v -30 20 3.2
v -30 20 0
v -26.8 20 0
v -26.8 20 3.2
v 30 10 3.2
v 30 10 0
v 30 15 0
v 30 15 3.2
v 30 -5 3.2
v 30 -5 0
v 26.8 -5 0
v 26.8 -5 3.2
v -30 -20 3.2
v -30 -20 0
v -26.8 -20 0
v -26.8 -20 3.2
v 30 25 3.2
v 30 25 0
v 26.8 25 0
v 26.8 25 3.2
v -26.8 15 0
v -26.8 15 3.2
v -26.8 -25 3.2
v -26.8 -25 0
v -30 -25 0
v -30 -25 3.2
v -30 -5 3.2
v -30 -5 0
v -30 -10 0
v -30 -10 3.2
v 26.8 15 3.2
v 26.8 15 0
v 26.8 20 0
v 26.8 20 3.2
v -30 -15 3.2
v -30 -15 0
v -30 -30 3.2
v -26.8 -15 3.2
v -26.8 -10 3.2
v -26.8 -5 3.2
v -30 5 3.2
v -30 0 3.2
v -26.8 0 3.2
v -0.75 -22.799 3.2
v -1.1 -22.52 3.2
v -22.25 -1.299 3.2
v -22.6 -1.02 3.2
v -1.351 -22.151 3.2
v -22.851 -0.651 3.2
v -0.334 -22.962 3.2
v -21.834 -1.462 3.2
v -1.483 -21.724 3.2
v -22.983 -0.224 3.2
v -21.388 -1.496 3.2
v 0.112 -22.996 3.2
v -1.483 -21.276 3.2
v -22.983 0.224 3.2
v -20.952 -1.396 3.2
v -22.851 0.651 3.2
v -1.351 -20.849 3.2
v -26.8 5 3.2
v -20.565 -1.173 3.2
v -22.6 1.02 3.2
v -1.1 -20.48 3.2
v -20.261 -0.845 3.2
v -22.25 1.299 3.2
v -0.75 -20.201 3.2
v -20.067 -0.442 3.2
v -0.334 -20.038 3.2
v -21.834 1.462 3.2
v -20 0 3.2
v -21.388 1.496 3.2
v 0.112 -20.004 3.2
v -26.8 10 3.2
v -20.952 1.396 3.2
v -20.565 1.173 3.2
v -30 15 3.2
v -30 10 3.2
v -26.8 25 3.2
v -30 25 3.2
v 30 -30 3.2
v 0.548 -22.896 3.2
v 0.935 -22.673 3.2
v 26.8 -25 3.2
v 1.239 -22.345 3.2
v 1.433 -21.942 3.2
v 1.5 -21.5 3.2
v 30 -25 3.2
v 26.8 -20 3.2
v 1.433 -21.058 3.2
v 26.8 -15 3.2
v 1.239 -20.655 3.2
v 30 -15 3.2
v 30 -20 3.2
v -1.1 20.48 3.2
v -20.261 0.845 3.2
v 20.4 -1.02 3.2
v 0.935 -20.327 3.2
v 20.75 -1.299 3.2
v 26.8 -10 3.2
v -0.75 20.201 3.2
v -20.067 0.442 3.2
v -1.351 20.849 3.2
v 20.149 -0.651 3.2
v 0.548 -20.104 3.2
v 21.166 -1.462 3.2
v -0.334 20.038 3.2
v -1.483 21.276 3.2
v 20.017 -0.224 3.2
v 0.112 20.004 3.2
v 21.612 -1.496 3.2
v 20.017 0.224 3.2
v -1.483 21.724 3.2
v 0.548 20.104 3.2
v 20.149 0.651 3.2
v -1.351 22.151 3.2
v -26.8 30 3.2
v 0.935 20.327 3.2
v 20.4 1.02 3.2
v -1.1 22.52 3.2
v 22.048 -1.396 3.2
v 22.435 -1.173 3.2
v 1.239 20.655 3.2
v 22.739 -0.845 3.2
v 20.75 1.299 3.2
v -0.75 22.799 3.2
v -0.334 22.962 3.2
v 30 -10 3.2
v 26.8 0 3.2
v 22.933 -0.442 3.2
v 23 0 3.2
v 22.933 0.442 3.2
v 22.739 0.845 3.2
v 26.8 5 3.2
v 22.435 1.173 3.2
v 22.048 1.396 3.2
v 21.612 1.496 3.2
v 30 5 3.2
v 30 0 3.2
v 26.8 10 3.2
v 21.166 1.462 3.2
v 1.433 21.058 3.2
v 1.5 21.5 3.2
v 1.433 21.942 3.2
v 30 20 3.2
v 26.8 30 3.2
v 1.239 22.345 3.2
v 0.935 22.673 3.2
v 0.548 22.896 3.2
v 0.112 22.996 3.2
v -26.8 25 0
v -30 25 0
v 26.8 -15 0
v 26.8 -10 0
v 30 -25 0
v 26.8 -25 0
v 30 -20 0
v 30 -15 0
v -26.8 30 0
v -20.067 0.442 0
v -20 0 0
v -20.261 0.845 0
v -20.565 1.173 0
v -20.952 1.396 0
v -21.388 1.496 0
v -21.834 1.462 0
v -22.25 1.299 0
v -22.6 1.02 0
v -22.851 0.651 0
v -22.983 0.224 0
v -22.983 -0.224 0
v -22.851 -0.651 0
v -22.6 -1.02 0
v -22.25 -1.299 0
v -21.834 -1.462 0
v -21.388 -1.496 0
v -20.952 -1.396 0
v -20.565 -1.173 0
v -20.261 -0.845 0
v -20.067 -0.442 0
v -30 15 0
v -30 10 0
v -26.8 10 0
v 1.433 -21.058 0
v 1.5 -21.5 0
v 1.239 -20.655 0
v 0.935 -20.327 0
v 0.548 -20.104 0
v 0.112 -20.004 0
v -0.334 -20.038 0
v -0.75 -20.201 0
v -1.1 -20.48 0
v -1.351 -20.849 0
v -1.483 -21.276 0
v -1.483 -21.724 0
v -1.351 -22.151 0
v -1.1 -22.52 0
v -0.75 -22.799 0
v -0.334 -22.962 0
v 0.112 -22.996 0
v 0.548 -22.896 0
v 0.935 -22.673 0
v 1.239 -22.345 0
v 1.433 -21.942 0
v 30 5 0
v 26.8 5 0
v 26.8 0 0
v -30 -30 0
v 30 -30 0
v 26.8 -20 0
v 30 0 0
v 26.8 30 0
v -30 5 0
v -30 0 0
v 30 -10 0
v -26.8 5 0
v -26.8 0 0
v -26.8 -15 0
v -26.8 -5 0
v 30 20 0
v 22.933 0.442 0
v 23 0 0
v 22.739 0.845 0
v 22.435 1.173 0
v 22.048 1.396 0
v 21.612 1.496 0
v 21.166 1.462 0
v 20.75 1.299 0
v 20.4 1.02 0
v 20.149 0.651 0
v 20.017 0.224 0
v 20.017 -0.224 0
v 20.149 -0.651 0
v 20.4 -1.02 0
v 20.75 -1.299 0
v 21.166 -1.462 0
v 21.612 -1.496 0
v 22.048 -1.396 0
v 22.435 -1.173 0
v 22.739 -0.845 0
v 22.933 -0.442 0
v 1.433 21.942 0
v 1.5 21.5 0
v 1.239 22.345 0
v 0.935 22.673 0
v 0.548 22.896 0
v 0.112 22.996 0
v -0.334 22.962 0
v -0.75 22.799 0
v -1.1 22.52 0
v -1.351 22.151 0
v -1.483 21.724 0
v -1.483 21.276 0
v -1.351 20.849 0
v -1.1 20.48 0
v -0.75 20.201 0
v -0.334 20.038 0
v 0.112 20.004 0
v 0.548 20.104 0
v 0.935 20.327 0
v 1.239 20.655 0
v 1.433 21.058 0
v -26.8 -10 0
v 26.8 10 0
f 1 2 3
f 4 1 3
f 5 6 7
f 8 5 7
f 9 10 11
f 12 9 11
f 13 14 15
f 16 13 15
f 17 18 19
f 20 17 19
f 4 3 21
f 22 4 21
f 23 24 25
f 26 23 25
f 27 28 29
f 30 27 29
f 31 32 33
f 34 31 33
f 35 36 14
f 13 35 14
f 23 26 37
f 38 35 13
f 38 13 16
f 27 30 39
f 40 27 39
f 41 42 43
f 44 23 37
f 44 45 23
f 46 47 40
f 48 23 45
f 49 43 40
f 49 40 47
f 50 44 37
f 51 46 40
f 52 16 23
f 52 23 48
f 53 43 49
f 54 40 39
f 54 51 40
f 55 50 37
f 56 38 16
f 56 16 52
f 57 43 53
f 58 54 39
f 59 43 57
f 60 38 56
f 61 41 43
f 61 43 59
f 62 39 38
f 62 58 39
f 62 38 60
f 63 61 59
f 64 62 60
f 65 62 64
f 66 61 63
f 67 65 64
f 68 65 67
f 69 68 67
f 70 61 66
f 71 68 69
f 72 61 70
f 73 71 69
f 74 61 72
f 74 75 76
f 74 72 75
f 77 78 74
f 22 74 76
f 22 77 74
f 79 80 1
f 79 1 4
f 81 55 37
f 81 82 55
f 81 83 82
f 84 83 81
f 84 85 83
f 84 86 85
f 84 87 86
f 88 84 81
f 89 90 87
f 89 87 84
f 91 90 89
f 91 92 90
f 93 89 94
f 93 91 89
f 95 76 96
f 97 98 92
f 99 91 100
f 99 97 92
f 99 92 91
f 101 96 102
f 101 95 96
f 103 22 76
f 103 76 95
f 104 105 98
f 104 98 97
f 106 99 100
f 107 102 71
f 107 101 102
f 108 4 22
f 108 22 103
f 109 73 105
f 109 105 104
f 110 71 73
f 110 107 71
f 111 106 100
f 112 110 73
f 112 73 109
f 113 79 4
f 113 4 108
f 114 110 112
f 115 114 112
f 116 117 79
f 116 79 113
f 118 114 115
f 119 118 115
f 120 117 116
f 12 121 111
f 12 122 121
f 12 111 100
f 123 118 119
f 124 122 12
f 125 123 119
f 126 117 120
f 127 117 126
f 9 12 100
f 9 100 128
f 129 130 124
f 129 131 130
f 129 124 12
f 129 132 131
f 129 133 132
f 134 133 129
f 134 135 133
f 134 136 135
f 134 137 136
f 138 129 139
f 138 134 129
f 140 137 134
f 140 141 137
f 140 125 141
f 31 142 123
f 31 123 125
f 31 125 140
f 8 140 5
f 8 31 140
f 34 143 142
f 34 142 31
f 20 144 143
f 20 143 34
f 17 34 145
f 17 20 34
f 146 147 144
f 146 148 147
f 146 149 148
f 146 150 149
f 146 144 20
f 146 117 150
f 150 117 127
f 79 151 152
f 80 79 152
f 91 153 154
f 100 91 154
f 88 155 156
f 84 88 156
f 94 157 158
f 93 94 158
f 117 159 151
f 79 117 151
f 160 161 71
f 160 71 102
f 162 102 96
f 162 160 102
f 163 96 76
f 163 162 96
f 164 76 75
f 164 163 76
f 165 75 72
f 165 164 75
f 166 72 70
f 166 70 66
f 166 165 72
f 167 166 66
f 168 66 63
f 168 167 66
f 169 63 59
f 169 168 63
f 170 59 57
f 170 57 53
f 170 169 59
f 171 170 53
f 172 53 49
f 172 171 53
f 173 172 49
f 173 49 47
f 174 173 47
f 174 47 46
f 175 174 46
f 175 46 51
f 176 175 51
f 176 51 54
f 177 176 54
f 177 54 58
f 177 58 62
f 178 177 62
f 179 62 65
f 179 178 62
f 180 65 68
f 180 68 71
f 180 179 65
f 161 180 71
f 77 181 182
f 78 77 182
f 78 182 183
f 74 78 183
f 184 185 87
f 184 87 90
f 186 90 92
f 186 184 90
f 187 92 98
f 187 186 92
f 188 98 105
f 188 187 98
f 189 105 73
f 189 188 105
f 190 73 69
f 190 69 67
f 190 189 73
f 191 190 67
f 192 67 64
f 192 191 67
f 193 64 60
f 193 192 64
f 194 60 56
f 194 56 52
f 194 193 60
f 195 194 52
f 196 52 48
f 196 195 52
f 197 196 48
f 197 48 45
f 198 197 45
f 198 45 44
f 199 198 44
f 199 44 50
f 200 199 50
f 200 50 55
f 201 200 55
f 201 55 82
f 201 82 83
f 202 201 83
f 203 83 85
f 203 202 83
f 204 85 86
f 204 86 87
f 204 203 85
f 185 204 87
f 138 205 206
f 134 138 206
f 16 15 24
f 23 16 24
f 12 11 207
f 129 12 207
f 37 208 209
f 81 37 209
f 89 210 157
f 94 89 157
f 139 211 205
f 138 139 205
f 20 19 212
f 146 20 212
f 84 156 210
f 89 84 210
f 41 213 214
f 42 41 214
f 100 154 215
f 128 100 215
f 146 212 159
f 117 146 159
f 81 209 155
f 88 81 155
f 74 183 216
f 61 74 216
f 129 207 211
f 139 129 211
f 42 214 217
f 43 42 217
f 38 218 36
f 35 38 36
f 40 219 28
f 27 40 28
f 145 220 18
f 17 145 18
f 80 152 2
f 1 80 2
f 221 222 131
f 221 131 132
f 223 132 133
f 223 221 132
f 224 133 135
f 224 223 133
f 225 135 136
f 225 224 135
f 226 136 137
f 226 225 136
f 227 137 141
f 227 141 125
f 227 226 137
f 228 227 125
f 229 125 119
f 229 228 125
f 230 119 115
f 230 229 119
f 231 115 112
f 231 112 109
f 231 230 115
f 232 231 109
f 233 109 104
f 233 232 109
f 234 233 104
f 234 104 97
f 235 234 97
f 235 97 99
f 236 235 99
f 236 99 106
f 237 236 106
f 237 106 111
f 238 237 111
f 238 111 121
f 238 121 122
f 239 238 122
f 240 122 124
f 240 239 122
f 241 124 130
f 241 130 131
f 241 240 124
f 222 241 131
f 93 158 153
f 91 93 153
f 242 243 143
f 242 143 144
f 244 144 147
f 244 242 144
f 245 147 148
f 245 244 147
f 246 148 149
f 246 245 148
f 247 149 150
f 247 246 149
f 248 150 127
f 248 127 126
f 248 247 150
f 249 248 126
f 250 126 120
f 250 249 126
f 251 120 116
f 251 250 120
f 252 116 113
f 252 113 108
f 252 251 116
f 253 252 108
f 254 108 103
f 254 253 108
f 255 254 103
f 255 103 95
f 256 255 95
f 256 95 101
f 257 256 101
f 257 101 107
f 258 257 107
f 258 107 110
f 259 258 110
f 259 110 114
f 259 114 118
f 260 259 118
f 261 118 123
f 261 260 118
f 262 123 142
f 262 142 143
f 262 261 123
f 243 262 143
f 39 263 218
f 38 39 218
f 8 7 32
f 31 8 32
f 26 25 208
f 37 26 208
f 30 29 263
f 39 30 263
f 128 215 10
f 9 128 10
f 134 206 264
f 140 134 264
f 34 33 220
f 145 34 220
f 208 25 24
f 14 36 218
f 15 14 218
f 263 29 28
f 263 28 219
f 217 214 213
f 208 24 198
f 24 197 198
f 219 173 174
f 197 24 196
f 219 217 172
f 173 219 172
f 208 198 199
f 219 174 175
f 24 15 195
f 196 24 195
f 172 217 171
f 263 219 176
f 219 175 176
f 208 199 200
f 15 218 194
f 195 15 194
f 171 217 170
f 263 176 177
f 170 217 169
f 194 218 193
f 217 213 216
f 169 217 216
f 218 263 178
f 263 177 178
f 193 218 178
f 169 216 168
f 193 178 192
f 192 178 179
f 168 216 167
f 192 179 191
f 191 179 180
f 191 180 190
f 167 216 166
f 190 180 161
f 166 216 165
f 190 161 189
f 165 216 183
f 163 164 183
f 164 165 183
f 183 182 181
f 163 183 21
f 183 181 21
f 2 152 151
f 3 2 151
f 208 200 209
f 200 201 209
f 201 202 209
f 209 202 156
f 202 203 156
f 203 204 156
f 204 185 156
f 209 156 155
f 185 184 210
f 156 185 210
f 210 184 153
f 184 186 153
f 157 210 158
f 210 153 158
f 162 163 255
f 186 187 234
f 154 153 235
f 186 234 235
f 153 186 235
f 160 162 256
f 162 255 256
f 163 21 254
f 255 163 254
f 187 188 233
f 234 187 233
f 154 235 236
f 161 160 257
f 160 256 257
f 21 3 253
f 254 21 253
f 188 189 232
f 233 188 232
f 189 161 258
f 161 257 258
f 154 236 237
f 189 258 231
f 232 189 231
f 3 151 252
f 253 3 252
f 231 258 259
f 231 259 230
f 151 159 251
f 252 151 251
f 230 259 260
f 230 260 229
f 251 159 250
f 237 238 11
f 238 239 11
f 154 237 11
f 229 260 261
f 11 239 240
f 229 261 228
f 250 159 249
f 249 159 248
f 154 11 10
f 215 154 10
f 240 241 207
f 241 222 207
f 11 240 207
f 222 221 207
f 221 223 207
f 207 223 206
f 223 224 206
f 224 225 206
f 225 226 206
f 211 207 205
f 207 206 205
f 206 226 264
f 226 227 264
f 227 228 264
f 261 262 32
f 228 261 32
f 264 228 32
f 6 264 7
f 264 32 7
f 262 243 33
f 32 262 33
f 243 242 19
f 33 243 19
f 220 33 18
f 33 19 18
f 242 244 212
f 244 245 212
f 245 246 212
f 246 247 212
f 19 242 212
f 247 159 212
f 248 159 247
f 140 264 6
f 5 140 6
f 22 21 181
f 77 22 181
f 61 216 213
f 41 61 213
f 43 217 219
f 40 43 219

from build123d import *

# Parameters (mm, degrees)
F0_R     = 1.5
F1_DEPTH = 3.2


with BuildPart() as f1:
    # F0 (on Top) → F1 (new body)
    with BuildSketch(Plane.XY):
        Polygon((26.8, 25), (26.8, 30), (-26.8, 30), (-26.8, 25), (-30, 25), (-30, 20), (-26.8, 20), (-26.8, 15), (-30, 15), (-30, 10), (-26.8, 10), (-26.8, 5), (-30, 5), (-30, 0), (-26.8, 0), (-26.8, -5), (-30, -5), (-30, -10), (-26.8, -10), (-26.8, -15), (-30, -15), (-30, -20), (-26.8, -20), (-26.8, -25), (-30, -25), (-30, -30), (30, -30), (30, -25), (26.8, -25), (26.8, -20), (30, -20), (30, -15), (26.8, -15), (26.8, -10), (30, -10), (30, -5), (26.8, -5), (26.8, 0), (30, 0), (30, 5), (26.8, 5), (26.8, 10), (30, 10), (30, 15), (26.8, 15), (26.8, 20), (30, 20), (30, 25), align=None)
        with Locations((0, -21.5)):
            Circle(F0_R, mode=Mode.SUBTRACT)
        with Locations((-21.5, 0)):
            Circle(F0_R, mode=Mode.SUBTRACT)
        with Locations((21.5, 0)):
            Circle(F0_R, mode=Mode.SUBTRACT)
        with Locations((0, 21.5)):
            Circle(F0_R, mode=Mode.SUBTRACT)
    extrude(amount=F1_DEPTH)


solid = f1.part
